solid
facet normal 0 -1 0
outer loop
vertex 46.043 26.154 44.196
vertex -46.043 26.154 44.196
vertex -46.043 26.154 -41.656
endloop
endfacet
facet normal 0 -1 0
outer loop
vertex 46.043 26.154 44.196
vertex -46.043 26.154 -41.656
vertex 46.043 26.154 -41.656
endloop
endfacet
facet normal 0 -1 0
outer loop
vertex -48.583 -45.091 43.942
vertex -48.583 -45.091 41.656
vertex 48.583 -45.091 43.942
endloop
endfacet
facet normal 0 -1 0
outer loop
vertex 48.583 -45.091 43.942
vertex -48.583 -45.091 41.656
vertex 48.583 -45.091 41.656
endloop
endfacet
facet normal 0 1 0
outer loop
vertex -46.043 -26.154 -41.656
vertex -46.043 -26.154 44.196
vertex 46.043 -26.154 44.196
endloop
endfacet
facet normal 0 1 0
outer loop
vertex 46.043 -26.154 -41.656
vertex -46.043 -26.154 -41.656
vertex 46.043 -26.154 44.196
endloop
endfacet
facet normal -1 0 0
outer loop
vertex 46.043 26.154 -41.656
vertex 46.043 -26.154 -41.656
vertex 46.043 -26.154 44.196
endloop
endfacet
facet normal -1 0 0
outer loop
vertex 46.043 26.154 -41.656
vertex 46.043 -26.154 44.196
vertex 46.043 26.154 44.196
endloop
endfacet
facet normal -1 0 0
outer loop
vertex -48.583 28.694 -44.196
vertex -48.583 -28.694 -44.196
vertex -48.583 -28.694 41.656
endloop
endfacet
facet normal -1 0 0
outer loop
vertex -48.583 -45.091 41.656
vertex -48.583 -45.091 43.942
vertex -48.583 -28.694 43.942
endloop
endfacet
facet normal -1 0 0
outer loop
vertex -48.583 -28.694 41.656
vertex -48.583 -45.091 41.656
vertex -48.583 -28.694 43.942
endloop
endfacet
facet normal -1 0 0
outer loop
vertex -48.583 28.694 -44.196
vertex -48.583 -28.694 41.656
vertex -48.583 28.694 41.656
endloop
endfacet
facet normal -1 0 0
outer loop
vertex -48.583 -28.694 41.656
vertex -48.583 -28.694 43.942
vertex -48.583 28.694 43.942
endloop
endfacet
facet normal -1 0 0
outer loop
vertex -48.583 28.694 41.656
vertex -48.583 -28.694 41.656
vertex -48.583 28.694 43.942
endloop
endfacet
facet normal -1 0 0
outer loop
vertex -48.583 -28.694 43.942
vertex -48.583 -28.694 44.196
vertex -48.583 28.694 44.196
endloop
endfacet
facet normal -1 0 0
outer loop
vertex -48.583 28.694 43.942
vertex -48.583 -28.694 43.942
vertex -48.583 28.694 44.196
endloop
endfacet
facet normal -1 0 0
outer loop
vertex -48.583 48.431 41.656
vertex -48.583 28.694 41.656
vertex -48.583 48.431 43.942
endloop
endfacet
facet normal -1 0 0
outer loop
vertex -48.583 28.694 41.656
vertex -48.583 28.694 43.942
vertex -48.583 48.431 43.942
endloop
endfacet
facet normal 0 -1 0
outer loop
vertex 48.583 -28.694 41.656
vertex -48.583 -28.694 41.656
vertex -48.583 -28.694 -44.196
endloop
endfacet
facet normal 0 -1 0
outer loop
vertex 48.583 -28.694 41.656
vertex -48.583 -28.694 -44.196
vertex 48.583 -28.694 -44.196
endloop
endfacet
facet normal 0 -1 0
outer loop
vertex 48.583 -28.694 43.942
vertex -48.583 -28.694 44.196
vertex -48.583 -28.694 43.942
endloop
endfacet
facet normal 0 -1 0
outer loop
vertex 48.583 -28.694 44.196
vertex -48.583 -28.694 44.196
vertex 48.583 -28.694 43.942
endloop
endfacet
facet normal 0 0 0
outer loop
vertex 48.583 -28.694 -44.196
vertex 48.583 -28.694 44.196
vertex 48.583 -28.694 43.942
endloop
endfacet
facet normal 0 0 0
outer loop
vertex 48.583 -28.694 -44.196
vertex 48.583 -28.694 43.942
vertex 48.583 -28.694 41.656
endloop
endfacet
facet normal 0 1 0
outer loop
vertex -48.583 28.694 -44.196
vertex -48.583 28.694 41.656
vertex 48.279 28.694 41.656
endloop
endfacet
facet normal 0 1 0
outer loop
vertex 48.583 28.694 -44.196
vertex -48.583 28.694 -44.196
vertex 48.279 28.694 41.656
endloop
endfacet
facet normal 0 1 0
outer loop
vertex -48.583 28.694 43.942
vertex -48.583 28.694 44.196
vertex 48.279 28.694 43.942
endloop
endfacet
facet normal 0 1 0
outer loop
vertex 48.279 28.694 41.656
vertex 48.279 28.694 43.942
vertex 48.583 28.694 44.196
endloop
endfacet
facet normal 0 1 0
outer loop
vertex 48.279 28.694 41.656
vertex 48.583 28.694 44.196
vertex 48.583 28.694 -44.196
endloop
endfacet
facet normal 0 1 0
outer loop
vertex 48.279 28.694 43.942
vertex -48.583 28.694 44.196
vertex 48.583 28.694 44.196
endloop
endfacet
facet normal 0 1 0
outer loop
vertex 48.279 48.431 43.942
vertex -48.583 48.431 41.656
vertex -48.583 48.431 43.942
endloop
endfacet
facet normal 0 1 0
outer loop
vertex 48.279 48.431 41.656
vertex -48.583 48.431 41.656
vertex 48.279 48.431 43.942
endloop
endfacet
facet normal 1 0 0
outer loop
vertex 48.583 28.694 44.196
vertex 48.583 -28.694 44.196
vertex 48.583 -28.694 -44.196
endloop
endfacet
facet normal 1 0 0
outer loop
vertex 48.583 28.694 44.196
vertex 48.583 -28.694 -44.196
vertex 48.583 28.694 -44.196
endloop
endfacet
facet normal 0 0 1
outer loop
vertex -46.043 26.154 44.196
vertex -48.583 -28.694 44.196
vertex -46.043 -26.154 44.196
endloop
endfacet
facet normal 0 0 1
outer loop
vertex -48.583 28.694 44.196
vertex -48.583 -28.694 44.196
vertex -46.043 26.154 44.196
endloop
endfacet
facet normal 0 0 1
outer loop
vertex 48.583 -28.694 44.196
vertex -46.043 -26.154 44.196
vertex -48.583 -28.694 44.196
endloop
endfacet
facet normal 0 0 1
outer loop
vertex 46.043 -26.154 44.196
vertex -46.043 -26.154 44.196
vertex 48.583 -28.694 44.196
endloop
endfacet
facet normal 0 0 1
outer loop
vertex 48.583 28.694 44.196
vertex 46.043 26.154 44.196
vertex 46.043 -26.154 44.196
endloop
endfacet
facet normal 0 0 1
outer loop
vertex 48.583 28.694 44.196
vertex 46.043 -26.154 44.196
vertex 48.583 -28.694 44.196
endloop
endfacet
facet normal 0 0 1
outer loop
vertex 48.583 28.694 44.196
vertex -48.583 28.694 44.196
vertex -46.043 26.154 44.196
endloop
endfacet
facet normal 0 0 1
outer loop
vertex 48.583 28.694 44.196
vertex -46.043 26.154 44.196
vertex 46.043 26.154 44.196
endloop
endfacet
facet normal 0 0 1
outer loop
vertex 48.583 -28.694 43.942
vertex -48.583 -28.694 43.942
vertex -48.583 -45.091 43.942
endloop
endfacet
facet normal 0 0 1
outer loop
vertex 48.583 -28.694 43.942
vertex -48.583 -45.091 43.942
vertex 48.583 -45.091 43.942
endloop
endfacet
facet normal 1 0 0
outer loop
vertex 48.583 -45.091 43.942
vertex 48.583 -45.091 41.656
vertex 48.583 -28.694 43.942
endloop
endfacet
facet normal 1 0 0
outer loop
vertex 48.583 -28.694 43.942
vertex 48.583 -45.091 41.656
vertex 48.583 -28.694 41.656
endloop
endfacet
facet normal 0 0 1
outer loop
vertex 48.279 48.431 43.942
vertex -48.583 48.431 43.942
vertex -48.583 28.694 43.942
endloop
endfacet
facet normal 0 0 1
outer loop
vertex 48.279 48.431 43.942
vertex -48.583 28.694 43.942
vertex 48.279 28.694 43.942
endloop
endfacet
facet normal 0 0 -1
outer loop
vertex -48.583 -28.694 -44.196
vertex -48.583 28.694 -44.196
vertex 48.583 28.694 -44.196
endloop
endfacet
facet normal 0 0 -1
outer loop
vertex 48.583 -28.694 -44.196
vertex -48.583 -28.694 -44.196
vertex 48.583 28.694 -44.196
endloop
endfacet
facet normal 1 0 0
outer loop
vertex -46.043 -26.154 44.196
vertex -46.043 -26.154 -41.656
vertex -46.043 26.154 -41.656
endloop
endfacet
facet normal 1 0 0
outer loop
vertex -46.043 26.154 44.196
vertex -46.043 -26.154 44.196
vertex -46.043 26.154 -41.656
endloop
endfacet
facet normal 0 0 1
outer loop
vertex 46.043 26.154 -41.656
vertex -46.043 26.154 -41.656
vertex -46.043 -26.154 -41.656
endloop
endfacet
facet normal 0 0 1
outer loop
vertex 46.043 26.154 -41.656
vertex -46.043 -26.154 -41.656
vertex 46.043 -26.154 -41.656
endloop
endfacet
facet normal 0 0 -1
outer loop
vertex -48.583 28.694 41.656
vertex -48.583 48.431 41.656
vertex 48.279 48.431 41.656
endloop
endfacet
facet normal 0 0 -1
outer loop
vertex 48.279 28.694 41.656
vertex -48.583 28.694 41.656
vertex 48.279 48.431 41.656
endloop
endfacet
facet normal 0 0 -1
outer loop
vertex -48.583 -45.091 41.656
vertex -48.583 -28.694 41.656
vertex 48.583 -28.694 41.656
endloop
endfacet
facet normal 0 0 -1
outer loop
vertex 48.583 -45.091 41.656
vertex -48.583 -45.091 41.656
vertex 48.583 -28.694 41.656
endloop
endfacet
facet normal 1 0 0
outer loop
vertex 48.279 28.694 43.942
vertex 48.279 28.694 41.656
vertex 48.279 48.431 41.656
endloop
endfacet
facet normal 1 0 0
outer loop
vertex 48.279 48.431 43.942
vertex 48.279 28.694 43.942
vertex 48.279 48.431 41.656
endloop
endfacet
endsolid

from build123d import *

# Parameters (mm, degrees)
F0_W          = 97.1658453345
F0_H          = 57.3885776103
F1_DEPTH      = 44.196
F1_DEPTH_BACK = 44.196
F4_T          = -2.54
F5_START      = 41.656
F2_W          = 96.8622006476
F2_H          = 19.7368133813
F3_W          = 97.1658416092
F3_H          = 16.3967330009
F5_DEPTH      = 2.286


with BuildPart() as f1:
    # F0 (on Top) → F1 (new body, two sides)
    with BuildSketch(Plane.XY) as f1_sk:
        Rectangle(F0_W, F0_H)
    extrude(amount=F1_DEPTH)
    extrude(f1_sk.sketch, amount=-F1_DEPTH_BACK)

    # F4
    f4_openings = [f1.faces().sort_by_distance(p)[0] for p in [
        (0, 0, 44.196),
    ]]
    offset(amount=F4_T, openings=f4_openings)

    # F2 (on Top) + F3 (on Top) → F5 (join)
    with BuildSketch(Plane.XY.offset(F5_START)):
        with Locations((-0.1518223435, 38.5626954958)):
            Rectangle(F2_W, F2_H)
    with BuildSketch(Plane.XY.offset(F5_START)):
        with Locations((-1.8626e-06, -36.8926553056)):
            Rectangle(F3_W, F3_H)
    extrude(amount=F5_DEPTH)


solid = f1.part
